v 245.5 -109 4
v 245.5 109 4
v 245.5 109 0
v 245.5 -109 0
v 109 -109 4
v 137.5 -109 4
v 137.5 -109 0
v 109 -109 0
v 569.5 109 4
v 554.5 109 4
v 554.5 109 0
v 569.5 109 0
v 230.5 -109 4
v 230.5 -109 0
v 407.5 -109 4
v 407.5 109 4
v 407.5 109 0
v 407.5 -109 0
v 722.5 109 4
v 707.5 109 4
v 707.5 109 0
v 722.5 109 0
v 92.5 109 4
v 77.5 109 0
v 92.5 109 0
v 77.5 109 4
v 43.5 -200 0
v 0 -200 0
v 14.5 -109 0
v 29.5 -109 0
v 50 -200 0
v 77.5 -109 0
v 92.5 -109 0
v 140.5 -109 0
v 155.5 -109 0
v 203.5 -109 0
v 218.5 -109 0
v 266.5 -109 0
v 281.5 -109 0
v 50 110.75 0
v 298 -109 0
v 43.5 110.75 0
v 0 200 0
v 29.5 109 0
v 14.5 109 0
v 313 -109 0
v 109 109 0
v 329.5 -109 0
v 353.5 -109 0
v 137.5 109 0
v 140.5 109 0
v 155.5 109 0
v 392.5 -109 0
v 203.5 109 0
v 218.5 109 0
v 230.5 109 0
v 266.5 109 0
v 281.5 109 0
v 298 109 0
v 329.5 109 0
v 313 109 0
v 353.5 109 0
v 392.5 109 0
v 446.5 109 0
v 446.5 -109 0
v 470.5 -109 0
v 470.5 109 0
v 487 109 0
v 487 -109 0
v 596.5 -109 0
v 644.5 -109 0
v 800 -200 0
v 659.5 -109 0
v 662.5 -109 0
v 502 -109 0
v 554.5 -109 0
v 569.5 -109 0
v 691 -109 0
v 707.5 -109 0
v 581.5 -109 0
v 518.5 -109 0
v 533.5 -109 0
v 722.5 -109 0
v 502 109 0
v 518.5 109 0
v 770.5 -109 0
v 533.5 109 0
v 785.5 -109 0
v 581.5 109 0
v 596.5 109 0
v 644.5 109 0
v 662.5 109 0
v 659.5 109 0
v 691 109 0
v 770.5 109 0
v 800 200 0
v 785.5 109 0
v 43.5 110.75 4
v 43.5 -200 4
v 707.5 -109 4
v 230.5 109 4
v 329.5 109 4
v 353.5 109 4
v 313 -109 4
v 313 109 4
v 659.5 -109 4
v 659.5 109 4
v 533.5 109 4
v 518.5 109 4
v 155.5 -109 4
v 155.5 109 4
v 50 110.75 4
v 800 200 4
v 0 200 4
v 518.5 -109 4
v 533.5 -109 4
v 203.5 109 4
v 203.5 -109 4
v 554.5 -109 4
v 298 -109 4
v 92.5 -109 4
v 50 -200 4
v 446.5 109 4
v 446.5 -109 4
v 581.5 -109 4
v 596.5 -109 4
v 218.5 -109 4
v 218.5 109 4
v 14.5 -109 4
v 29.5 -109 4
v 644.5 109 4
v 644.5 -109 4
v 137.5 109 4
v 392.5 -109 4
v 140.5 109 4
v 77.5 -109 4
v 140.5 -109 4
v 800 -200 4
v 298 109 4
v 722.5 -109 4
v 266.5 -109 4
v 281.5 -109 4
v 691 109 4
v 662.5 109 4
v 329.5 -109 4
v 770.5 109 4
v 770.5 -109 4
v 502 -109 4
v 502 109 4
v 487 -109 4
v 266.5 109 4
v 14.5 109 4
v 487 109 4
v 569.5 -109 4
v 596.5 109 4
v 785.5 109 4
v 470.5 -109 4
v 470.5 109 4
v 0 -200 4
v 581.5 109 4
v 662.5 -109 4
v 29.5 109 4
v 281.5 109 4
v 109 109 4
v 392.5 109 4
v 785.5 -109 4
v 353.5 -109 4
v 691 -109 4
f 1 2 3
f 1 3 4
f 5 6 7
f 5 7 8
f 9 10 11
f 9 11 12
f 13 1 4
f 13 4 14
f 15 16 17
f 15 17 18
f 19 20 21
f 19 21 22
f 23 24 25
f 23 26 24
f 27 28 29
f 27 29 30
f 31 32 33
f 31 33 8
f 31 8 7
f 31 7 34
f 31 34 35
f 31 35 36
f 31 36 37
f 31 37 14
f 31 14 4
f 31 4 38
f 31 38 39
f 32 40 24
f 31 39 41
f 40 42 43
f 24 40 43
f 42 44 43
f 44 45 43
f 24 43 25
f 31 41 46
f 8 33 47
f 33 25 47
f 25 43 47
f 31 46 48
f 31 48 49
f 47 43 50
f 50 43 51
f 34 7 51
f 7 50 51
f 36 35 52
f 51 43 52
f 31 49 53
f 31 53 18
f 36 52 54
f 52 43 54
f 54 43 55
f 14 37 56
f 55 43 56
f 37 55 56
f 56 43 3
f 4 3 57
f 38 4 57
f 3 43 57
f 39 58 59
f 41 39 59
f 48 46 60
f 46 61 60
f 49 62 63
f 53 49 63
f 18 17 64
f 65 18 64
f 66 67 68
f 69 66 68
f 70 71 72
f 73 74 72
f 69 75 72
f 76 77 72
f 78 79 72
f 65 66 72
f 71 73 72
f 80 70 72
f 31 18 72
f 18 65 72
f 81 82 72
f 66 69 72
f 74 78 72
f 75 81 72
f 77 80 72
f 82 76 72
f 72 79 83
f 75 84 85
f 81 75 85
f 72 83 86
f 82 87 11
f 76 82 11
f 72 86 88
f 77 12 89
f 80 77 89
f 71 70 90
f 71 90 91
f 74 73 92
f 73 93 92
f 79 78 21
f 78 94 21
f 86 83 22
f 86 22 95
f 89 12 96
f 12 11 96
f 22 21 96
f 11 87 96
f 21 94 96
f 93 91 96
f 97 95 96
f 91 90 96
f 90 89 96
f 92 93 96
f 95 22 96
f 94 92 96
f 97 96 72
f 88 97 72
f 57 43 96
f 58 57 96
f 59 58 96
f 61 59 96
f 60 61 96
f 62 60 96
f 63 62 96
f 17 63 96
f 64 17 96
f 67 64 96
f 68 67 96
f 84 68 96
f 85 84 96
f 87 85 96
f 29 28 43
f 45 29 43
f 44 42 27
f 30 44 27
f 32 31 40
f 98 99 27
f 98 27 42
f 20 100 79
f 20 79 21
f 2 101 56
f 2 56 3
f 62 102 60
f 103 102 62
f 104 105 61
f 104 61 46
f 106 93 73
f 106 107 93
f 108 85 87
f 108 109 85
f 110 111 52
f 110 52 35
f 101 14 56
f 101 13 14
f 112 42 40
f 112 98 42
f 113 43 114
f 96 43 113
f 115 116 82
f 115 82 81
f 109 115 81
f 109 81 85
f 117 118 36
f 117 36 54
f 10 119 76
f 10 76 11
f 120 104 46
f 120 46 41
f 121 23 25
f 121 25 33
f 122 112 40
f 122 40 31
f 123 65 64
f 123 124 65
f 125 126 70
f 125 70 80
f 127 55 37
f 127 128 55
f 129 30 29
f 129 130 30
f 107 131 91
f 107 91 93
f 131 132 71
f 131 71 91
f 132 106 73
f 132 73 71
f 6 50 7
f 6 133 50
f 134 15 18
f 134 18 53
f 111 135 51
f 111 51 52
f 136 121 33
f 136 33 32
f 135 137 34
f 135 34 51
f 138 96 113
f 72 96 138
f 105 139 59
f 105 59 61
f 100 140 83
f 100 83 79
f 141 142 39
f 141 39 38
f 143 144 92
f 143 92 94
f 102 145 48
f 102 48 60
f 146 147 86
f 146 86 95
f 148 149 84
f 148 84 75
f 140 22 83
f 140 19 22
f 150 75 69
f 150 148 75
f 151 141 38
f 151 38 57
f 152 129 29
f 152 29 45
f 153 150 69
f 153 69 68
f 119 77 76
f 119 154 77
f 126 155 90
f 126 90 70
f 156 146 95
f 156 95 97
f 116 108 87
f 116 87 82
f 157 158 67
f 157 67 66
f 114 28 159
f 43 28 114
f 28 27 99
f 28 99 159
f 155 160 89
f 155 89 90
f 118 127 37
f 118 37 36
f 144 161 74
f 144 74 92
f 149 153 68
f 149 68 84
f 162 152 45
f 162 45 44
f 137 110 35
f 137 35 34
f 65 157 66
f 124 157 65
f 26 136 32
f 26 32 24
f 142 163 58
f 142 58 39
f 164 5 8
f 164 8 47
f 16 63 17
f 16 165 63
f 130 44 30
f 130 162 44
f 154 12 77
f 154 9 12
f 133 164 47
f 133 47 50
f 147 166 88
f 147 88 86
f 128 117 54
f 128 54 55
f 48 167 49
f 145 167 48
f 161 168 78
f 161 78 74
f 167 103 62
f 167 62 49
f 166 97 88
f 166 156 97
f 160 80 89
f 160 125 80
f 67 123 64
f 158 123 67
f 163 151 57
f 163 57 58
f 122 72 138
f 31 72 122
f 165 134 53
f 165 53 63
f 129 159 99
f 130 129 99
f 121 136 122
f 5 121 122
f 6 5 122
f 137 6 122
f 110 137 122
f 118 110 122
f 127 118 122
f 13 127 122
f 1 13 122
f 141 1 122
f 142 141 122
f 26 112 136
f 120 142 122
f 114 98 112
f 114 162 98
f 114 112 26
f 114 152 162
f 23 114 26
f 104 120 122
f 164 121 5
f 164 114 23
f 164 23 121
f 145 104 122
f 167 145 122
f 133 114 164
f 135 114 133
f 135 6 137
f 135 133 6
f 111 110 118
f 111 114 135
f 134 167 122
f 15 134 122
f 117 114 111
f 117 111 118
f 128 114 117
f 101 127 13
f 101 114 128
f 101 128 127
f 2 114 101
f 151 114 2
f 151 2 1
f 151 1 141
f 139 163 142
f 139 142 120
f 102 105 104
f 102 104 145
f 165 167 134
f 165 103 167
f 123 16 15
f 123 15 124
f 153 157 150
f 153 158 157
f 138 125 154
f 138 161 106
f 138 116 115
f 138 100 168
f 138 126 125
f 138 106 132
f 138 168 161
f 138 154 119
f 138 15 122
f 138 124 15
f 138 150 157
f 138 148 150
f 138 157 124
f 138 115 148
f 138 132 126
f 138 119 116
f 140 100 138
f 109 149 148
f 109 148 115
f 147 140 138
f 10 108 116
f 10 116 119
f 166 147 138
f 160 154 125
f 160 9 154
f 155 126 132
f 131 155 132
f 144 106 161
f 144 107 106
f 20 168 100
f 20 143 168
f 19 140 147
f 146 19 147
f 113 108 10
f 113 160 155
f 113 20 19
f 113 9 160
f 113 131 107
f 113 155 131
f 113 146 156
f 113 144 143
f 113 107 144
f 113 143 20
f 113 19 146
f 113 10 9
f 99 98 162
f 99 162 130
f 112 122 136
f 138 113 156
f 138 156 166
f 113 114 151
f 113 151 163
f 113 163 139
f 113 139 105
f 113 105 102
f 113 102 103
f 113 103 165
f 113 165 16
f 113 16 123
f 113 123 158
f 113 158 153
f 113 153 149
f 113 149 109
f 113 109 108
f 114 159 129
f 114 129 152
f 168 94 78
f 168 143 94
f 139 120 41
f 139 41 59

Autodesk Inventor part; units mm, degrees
ref_plane "YZ Plane" through (0, 0, 0) normal (1, 0, 0) x (0, 1, 0)
ref_plane "XZ Plane" through (0, 0, 0) normal (0, 1, 0) x (-1, 0, 0)
sketch "ferrite_layer_outline_sketch" plane through (0, 0, 0) normal (0, 0, 1) x (1, 0, 0)
  line L0 (0, 200) -> (800, 200)
  line L1 (800, 200) -> (800, -200)
  line L2 (800, -200) -> (0, -200)
  line L3 (0, -200) -> (0, 200)
  line L4 (-160, 0) -> (960, 0) projected
  line L5 (400, 200) -> (400, -200) construction
  line L6 (400, 366.8869) -> (400, -324.3455) construction
  line L7 (400, 200) -> (400, -200)
  point P0 (0, 0)
  point P1 (0, 0)
  point P2 (0, 0)
  point P3 (0, 0)
  point P4 (20, 0)
  dimension "d0" = 800
  dimension "d1" = 400
extrude "Sheet Extrude" add sketch "ferrite_layer_outline_sketch" along normal blind 4
ref_plane "acrylic_sheet_plane" through (0, 0, 4) normal (0, 0, 1) x (1, 0, 0)
sketch "Sketch4" plane through (0, 0, 4) normal (0, 0, 1) x (1, 0, 0)
  line L0 (14.5, 109) -> (29.5, 109)
  line L1 (29.5, 109) -> (29.5, -109)
  line L2 (29.5, -109) -> (14.5, -109)
  line L3 (14.5, -109) -> (14.5, 109)
  line L4 (-12.6534, 0) -> (47.471, 0)
  line L5 (0, 200) -> (0, -200) projected
  line L6 (800, 200) -> (0, 200) projected
  line L7 (0, -200) -> (800, -200) projected
  point P0 (0, 0)
  point P1 (14.5, 0)
  point P2 (0, 0)
  dimension "d43" = 15
  dimension "d44" = 218
  dimension "d45" = 14.5
extrude "Extrusion9" cut sketch "Sketch4" against normal through all
pattern_linear "Rectangular Pattern 7 fer" count 7 spacing 126 along (1, 0, 0) of "Extrusion9"
pattern_linear "Rectangular Pattern 8 fer" count 8 spacing 108 along (1, 0, 0) of "Extrusion9"
pattern_linear "pattern_test_#_of_ferrites 9 fer" count 9 spacing 94.5 along (1, 0, 0) of "Extrusion9"
pattern_linear "Rectangular Pattern 10 fer" [suppressed]
pattern_linear "Rectangular Pattern 13" count 13 spacing 63 along (1, 0, 0) of "Extrusion9"
sketch "Sketch5" plane through (0, 0, 4) normal (0, 0, 1) x (1, 0, 0)
  line L0 (0, 200) -> (0, -200) projected
  line L1 (0, 150) -> (800, 150)
  line L2 (800, -200) -> (800, 200) projected
  line L3 (800, 200) -> (0, 200) projected
  line L4 (0, -200) -> (800, -200) projected
  line L5 (0, -150) -> (800, -150)
  point P0 (0, 0)
  dimension "d66" = 50
  dimension "d68" = 50
sketch "Sketch11" plane through (0, 0, 4) normal (0, 0, 1) x (1, 0, 0)
  circle A0 centre (47, 7.75) radius 3
  line L0 (800, 200) -> (0, 200) projected
  line L1 (0, 200) -> (0, -200) projected
  circle A1 centre (47, -72) radius 3
  line L2 (0, -200) -> (800, -200) projected
  point P0 (0, 0)
  dimension "d85" = 6
  dimension "d86" = 192.25
  dimension "d87" = 47
  dimension "d88" = 6
  dimension "d89" = 128
  dimension "d90" = 47
extrude "Extrusion15" cut sketch "Sketch11" against normal through all
sketch "Sketch12" plane through (0, 0, 4) normal (0, 0, 1) x (1, 0, 0)
  line L0 (0, -200) -> (800, -200) projected
  line L1 (43.5, 110.75) -> (50, 110.75)
  line L2 (50, 110.75) -> (50, -200)
  line L3 (50, -200) -> (43.5, -200)
  line L4 (43.5, -200) -> (43.5, 110.75)
  line L5 (0, 200) -> (0, -200) projected
  point P0 (0, 0)
  dimension "d97" = 310.75
  dimension "d98" = 6.5
  dimension "d99" = 43.5
extrude "Extrusion17" cut sketch "Sketch12" against normal through all
equation "\"d0\" = track_length"
equation "\"d1\" = track_width"
equation "\"d43\" = ferrite_width"
equation "\"d44\" = ferrite_length"
equation "\"d45\" = gap_distance"
equation "\"d50\" = parameter_5"
equation "\"d62\" = test_parameter_5"
equation "\"track_length\" = 800"
equation "\"track_width\" = 400"
equation "\"gap_distance\" = 14.5"
equation "\"ferrite_length\" = 218"
equation "\"ferrite_width\" = 15"
equation "\"ferrite_height\" = 8"
equation "\"acrylic_sheet_8mm\" = 8"
equation "\"parameter_5\" = 126"
equation "\"test_parameter_5\" = 94.5"
properties part number "ferrite_layer_dex_1R1"
